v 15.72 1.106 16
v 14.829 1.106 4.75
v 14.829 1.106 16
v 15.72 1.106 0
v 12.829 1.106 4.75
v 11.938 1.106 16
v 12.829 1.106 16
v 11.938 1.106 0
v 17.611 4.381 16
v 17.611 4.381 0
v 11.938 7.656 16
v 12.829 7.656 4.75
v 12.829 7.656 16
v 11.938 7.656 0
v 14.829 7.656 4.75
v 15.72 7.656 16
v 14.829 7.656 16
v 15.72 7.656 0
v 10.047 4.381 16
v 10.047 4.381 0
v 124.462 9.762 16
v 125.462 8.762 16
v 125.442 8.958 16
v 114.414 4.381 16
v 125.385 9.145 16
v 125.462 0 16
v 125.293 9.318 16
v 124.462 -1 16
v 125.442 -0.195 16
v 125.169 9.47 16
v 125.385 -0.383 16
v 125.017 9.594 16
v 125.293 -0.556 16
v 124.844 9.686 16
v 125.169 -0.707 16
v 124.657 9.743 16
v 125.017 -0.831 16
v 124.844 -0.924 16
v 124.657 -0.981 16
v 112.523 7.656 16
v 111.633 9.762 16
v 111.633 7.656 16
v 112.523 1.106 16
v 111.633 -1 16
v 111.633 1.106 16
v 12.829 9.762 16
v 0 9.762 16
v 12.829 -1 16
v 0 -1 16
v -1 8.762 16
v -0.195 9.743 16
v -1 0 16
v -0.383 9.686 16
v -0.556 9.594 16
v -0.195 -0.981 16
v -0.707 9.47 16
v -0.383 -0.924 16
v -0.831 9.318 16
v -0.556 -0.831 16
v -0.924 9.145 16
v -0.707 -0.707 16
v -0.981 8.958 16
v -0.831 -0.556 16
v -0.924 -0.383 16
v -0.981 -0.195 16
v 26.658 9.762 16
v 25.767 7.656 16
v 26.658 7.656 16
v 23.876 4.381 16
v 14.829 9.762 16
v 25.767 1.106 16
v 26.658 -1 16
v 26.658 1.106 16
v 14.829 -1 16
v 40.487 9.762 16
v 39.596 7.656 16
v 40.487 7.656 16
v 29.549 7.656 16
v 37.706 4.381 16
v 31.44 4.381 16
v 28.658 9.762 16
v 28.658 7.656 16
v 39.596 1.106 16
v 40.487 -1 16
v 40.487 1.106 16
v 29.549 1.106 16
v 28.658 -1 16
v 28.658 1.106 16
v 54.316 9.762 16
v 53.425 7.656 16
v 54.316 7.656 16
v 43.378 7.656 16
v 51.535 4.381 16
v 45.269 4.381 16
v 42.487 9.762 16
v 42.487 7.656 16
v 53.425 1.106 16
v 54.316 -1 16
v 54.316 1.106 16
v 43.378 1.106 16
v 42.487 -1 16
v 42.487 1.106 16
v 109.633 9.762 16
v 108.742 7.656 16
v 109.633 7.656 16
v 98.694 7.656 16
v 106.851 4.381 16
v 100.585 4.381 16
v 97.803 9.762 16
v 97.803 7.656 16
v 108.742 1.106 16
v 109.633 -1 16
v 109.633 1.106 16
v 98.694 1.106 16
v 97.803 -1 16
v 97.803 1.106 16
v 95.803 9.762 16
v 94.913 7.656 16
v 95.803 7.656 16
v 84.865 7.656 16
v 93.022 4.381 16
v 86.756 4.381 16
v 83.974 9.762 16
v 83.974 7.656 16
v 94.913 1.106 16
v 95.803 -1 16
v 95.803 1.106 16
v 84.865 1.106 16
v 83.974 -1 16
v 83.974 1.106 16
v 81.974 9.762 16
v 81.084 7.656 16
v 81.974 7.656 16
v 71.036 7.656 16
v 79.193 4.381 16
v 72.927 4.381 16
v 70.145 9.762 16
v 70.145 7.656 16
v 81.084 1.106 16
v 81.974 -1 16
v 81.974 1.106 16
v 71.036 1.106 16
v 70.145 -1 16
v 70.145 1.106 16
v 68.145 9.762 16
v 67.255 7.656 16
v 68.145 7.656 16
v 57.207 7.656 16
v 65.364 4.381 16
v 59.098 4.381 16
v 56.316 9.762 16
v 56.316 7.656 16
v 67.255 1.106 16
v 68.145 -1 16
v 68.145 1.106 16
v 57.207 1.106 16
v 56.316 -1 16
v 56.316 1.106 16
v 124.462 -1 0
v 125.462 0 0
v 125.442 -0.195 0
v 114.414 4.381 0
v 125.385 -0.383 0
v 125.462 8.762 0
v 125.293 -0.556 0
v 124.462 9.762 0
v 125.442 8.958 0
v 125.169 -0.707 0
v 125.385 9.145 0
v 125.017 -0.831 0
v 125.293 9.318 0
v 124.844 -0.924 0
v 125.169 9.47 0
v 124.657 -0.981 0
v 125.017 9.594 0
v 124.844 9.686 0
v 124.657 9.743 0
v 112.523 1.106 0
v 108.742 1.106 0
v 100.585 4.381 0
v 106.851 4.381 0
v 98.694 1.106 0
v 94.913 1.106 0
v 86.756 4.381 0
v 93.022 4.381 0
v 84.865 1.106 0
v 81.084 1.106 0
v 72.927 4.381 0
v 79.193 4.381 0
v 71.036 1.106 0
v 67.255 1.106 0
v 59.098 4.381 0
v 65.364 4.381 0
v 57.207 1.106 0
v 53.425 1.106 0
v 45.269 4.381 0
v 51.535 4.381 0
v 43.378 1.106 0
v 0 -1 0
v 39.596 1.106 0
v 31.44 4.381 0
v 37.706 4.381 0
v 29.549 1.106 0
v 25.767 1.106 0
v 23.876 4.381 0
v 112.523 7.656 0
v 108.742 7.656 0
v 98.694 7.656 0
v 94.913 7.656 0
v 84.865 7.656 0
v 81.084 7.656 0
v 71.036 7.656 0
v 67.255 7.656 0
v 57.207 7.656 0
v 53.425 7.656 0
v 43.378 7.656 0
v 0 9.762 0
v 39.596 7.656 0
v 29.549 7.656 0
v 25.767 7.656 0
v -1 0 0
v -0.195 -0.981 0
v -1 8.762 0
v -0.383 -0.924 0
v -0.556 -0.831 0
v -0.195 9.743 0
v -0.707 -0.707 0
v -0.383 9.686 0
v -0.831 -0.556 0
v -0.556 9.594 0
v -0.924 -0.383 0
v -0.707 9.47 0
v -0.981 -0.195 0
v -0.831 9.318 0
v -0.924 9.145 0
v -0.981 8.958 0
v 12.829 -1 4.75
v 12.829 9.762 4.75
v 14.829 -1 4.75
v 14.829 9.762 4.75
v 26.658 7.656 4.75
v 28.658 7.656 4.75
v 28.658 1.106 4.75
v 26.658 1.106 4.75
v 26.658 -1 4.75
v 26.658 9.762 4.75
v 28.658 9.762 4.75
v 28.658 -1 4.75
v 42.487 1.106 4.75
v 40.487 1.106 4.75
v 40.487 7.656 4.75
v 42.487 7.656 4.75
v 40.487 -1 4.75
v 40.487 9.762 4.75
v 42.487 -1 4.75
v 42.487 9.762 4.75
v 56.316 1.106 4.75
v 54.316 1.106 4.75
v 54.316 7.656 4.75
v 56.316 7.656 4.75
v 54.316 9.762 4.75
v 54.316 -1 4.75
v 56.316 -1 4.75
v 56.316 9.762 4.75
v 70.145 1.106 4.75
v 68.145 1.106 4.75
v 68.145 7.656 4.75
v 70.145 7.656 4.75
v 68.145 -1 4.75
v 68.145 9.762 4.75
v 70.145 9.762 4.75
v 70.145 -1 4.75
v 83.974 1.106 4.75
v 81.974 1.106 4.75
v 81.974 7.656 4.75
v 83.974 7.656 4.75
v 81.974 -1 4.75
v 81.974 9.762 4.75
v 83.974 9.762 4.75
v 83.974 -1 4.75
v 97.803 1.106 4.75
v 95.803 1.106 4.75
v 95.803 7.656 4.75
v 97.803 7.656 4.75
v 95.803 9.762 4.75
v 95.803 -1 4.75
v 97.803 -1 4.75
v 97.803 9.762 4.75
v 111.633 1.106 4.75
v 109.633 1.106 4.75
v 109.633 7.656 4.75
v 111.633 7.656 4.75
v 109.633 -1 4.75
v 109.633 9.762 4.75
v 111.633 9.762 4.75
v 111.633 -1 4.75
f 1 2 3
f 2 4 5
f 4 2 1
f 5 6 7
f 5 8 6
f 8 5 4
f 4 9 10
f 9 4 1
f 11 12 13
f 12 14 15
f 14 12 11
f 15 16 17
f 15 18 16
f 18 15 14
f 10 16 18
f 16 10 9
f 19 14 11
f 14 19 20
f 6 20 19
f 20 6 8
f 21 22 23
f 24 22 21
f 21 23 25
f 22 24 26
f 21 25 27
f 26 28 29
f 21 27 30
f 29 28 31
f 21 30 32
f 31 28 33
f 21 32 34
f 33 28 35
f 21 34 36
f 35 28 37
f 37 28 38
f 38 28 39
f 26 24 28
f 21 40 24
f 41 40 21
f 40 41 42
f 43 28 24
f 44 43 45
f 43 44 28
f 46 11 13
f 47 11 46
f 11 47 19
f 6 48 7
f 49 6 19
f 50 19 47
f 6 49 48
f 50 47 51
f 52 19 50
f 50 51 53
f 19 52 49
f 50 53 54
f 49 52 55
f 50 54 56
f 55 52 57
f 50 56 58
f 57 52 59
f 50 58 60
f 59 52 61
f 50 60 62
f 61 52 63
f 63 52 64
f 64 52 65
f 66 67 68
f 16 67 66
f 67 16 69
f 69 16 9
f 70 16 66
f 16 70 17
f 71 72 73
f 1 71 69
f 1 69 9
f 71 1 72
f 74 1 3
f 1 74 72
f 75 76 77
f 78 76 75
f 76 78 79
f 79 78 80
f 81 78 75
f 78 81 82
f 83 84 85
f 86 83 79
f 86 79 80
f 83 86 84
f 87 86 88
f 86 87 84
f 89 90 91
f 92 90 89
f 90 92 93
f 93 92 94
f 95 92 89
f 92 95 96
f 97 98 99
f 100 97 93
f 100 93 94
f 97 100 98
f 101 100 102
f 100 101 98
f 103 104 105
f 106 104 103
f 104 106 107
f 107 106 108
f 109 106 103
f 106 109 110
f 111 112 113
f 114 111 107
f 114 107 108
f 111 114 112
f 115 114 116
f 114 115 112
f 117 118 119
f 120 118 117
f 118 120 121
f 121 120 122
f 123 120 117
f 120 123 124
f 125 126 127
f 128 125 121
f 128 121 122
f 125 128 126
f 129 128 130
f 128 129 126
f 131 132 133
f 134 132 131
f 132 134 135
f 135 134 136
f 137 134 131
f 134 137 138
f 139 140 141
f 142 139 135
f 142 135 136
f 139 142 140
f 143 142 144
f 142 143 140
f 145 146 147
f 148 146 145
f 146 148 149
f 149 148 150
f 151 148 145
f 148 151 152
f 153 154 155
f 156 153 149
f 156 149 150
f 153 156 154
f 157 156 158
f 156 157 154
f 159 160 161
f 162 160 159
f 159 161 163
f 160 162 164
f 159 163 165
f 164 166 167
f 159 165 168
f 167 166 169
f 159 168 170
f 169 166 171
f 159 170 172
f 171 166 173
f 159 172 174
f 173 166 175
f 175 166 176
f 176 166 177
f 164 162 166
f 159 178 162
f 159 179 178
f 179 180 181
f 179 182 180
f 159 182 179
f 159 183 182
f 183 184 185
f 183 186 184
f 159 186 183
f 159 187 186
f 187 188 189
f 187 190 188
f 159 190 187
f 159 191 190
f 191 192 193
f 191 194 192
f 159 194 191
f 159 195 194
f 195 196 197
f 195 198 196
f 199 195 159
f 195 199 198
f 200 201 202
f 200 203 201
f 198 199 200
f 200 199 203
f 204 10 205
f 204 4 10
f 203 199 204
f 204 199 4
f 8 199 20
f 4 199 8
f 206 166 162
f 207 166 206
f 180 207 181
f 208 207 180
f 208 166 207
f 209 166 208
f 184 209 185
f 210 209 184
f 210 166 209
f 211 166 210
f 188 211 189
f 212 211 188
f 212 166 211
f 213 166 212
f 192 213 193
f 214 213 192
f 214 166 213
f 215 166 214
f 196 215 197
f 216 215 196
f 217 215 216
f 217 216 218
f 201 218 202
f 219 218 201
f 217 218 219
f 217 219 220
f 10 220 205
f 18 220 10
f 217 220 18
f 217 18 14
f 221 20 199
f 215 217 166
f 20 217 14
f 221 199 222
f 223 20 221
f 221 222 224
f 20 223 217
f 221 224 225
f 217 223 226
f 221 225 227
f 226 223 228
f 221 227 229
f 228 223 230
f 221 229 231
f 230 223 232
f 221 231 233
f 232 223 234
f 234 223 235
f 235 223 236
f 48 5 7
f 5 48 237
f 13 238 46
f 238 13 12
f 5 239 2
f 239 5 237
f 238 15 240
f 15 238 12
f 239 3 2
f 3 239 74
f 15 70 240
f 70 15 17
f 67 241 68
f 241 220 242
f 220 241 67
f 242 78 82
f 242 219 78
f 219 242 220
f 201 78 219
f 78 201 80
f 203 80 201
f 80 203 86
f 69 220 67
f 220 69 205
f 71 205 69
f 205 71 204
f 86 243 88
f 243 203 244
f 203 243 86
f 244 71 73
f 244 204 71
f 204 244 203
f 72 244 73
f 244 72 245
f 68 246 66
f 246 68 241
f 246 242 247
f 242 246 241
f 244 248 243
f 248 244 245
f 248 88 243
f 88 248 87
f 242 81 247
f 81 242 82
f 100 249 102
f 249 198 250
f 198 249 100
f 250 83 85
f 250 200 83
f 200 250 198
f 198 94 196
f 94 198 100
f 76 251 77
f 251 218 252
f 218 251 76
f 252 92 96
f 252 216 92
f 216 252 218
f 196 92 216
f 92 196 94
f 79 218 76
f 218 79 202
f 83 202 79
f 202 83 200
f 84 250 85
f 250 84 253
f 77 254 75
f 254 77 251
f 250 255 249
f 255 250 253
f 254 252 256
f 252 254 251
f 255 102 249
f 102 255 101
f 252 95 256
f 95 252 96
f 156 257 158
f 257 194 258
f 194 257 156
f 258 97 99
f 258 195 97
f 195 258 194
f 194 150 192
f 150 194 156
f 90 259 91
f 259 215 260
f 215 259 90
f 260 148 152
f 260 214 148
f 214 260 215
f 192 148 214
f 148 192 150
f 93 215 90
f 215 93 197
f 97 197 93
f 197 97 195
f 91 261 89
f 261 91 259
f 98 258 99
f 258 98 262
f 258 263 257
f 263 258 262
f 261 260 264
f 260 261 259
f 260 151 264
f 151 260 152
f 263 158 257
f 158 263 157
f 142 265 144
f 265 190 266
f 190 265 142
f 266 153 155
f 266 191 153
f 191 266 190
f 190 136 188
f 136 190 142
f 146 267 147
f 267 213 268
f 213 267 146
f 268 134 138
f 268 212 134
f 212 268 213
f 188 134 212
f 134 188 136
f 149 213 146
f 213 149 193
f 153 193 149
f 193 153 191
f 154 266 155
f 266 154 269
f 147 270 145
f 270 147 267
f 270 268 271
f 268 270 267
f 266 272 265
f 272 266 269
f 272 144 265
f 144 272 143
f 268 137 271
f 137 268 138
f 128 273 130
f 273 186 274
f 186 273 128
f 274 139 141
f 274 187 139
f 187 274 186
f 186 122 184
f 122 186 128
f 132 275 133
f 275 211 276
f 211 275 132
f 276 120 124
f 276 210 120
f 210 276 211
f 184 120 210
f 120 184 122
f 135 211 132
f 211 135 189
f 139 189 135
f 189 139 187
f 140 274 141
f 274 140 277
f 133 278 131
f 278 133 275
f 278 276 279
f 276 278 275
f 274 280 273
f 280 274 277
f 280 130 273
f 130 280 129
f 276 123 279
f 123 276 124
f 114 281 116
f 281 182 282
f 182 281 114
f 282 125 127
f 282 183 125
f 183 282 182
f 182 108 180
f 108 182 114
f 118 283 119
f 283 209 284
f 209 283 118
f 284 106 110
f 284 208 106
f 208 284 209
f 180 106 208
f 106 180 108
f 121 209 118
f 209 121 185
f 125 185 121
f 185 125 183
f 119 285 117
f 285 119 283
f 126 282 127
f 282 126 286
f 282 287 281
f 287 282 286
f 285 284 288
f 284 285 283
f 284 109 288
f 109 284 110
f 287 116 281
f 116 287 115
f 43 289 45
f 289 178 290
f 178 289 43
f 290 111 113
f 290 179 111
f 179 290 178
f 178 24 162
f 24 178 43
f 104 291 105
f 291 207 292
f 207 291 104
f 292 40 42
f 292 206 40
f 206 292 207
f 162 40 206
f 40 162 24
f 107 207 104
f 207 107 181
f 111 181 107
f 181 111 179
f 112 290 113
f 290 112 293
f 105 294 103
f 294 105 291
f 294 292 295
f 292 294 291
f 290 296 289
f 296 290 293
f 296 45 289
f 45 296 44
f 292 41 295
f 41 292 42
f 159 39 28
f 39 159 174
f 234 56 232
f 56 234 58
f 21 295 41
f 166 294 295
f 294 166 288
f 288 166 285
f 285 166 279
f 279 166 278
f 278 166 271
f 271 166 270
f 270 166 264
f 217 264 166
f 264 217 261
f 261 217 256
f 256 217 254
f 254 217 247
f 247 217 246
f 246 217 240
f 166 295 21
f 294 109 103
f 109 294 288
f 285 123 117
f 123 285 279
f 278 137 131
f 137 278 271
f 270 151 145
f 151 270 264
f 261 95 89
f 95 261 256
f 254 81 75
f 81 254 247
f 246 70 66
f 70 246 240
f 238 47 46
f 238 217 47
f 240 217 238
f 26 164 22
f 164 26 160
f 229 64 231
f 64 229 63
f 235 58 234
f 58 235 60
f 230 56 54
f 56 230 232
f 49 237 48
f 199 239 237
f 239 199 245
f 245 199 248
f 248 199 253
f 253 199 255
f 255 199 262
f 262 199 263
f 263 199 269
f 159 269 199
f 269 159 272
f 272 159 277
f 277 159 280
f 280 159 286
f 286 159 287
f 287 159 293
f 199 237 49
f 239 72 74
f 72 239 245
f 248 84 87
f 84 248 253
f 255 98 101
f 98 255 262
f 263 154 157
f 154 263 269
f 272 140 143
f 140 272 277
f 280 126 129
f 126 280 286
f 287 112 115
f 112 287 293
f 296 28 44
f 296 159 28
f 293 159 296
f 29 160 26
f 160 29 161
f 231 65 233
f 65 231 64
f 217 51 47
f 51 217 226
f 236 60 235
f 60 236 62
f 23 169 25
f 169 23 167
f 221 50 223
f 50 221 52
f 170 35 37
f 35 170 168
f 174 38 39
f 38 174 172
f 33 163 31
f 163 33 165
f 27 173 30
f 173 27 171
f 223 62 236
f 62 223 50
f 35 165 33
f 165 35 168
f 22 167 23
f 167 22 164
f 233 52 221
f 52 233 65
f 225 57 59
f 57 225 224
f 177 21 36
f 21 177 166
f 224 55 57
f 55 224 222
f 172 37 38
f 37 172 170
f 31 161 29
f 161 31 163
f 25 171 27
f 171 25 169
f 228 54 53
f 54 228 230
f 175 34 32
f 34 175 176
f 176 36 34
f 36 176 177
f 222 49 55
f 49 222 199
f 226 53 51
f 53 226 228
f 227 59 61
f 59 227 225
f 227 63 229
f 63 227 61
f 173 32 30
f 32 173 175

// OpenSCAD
/*
* Variable Spacing Customizable Hex Bit Holder
* by Wesley T. Honeycutt
* http://wesleythoneycutt.com
* Remixed from Customisable hex bit holder by Mykhaylo Lytvynyuk
* License changed to include derivatives so I could publish.
* Inherits CC-BY-NC-SA 3.0 license from original
*
* Version history:
*    v1 - Feb. 19, 2018
*      Summary of changes:
*      Initial publication.  This file allows the user to make
*      custom hex bit holders for parts with variable tool
*      radii.  While the hex bit size stays the same, some 
*      tools such as hex sockets have variable widths depending
*      on the size of the socket.  This design incorporates a
*      recursive function which calculates a new spacing for 
*      each individual part, such that there is enough room
*      on the holder to include all of the parts.  This design
*      currently only works in 1 dimension for the purpose of 
*      spacing the parts.  It cannot, at this time, create 
*      multiple rows of parts like the original.
*/

/**
	Customisable hex bit holder 
	Copyring Mykhaylo Lytvynyuk March 2015
	http://mobilemodding.info
	Released under 
	Attribution - Non-Commercial - No Derivatives License

	*** March 16, 2015 Initial Version
*/
 	
// Hex Socket sizes (in mm)
// This must be an array [brackets,and,commas] of widths.
_sizes = [
  25.4*3/16,
  25.4*3/16,
   25.4*3/16,
   25.4*3/16,
   25.4*3/16,
   25.4*3/16,
   25.4*3/16,
   25.4*3/16
   ];

// Wall thickness of socket
// This is extra padding for the thickness of the socket material.
// For example, if the socket says it is 1/2", the width of the
// tool is 1/2" + some metal thickness.
_sock = 2;
 					
// mm, base height
_height = 15; //default 15

// mm, printer tolerance, can be negative, required to compensate specific printer contraction/expansion during print.
_tolerance = 0.2;

//mm, between sides and bit
_extraPadding = 2;

// Rounded corners
_rounded = 1;//[1:Yes,0:No]

// Determines if hole goes compeltely through the base
_holeThrough = 1;	//[1:Yes,0:No]	

// Make slot to add flex to the walls
_slotted = 1;//[1:Yes,0:No]

// mm, defines bit size ( 6.35 is 1/4" )
_bitSize = 6.35;

/* [Hidden] */
// local vars
outerRadius = outRadius(_bitSize + _tolerance/2,6);
delta = outerRadius + _extraPadding;
minkowskiCylinderHeight = 1;
// calculates total length of object
eachLength = [ for (i = [0:(len(_sizes)-1)]) (((_sizes[i])/2) + _sock + delta )];  
function sumv(v,i,s=0) = (i==s ? v[i] : v[i] + sumv(v,i-1,s));
totalLength = (sumv(eachLength,(len(eachLength)-1),0)) + max(eachLength);
depth = max(_sizes)+4;
width = (outerRadius + _extraPadding);

module assembly() {

difference() {
	base();
    for(i = [0:(len(_sizes)-1)]) {
        if(i == 0) {
            translate([(eachLength[i]),depth/2,_holeThrough?0:1]) hexBit();
            if(_slotted){
                translate([(eachLength[i])+1,-2,minkowskiCylinderHeight + _height - _height * 0.75]) rotate([0,0,90]) cube([width + 8,2,_height*0.75],center=false);
            }
        }
        else {
            translate([(eachLength[i]+sumv(eachLength,i-1,0)),depth/2,_holeThrough?0:1]) hexBit();
            if(_slotted){
                translate([(eachLength[i]+sumv(eachLength,i-1,0))+1,-2,minkowskiCylinderHeight + _height - _height * 0.75]) rotate([0,0,90]) cube([width + 8,2,_height*0.75],center=false);
		}
        }
    }
}

}

module hexBit() {
	cylinder(h=_height+minkowskiCylinderHeight,r=outRadius(_bitSize/2 + _tolerance/2,6),$fn=6, center = false);
}

module base() {
	minkowski() {
		cube([totalLength,depth,_height]);
		if(_rounded) cylinder(r=1,h=minkowskiCylinderHeight,$fn=32,center = false);
	}
}

// calculates outradious by given inradius
function outRadius(inradius, sides) = inradius / ( cos (180 / sides));

assembly();
